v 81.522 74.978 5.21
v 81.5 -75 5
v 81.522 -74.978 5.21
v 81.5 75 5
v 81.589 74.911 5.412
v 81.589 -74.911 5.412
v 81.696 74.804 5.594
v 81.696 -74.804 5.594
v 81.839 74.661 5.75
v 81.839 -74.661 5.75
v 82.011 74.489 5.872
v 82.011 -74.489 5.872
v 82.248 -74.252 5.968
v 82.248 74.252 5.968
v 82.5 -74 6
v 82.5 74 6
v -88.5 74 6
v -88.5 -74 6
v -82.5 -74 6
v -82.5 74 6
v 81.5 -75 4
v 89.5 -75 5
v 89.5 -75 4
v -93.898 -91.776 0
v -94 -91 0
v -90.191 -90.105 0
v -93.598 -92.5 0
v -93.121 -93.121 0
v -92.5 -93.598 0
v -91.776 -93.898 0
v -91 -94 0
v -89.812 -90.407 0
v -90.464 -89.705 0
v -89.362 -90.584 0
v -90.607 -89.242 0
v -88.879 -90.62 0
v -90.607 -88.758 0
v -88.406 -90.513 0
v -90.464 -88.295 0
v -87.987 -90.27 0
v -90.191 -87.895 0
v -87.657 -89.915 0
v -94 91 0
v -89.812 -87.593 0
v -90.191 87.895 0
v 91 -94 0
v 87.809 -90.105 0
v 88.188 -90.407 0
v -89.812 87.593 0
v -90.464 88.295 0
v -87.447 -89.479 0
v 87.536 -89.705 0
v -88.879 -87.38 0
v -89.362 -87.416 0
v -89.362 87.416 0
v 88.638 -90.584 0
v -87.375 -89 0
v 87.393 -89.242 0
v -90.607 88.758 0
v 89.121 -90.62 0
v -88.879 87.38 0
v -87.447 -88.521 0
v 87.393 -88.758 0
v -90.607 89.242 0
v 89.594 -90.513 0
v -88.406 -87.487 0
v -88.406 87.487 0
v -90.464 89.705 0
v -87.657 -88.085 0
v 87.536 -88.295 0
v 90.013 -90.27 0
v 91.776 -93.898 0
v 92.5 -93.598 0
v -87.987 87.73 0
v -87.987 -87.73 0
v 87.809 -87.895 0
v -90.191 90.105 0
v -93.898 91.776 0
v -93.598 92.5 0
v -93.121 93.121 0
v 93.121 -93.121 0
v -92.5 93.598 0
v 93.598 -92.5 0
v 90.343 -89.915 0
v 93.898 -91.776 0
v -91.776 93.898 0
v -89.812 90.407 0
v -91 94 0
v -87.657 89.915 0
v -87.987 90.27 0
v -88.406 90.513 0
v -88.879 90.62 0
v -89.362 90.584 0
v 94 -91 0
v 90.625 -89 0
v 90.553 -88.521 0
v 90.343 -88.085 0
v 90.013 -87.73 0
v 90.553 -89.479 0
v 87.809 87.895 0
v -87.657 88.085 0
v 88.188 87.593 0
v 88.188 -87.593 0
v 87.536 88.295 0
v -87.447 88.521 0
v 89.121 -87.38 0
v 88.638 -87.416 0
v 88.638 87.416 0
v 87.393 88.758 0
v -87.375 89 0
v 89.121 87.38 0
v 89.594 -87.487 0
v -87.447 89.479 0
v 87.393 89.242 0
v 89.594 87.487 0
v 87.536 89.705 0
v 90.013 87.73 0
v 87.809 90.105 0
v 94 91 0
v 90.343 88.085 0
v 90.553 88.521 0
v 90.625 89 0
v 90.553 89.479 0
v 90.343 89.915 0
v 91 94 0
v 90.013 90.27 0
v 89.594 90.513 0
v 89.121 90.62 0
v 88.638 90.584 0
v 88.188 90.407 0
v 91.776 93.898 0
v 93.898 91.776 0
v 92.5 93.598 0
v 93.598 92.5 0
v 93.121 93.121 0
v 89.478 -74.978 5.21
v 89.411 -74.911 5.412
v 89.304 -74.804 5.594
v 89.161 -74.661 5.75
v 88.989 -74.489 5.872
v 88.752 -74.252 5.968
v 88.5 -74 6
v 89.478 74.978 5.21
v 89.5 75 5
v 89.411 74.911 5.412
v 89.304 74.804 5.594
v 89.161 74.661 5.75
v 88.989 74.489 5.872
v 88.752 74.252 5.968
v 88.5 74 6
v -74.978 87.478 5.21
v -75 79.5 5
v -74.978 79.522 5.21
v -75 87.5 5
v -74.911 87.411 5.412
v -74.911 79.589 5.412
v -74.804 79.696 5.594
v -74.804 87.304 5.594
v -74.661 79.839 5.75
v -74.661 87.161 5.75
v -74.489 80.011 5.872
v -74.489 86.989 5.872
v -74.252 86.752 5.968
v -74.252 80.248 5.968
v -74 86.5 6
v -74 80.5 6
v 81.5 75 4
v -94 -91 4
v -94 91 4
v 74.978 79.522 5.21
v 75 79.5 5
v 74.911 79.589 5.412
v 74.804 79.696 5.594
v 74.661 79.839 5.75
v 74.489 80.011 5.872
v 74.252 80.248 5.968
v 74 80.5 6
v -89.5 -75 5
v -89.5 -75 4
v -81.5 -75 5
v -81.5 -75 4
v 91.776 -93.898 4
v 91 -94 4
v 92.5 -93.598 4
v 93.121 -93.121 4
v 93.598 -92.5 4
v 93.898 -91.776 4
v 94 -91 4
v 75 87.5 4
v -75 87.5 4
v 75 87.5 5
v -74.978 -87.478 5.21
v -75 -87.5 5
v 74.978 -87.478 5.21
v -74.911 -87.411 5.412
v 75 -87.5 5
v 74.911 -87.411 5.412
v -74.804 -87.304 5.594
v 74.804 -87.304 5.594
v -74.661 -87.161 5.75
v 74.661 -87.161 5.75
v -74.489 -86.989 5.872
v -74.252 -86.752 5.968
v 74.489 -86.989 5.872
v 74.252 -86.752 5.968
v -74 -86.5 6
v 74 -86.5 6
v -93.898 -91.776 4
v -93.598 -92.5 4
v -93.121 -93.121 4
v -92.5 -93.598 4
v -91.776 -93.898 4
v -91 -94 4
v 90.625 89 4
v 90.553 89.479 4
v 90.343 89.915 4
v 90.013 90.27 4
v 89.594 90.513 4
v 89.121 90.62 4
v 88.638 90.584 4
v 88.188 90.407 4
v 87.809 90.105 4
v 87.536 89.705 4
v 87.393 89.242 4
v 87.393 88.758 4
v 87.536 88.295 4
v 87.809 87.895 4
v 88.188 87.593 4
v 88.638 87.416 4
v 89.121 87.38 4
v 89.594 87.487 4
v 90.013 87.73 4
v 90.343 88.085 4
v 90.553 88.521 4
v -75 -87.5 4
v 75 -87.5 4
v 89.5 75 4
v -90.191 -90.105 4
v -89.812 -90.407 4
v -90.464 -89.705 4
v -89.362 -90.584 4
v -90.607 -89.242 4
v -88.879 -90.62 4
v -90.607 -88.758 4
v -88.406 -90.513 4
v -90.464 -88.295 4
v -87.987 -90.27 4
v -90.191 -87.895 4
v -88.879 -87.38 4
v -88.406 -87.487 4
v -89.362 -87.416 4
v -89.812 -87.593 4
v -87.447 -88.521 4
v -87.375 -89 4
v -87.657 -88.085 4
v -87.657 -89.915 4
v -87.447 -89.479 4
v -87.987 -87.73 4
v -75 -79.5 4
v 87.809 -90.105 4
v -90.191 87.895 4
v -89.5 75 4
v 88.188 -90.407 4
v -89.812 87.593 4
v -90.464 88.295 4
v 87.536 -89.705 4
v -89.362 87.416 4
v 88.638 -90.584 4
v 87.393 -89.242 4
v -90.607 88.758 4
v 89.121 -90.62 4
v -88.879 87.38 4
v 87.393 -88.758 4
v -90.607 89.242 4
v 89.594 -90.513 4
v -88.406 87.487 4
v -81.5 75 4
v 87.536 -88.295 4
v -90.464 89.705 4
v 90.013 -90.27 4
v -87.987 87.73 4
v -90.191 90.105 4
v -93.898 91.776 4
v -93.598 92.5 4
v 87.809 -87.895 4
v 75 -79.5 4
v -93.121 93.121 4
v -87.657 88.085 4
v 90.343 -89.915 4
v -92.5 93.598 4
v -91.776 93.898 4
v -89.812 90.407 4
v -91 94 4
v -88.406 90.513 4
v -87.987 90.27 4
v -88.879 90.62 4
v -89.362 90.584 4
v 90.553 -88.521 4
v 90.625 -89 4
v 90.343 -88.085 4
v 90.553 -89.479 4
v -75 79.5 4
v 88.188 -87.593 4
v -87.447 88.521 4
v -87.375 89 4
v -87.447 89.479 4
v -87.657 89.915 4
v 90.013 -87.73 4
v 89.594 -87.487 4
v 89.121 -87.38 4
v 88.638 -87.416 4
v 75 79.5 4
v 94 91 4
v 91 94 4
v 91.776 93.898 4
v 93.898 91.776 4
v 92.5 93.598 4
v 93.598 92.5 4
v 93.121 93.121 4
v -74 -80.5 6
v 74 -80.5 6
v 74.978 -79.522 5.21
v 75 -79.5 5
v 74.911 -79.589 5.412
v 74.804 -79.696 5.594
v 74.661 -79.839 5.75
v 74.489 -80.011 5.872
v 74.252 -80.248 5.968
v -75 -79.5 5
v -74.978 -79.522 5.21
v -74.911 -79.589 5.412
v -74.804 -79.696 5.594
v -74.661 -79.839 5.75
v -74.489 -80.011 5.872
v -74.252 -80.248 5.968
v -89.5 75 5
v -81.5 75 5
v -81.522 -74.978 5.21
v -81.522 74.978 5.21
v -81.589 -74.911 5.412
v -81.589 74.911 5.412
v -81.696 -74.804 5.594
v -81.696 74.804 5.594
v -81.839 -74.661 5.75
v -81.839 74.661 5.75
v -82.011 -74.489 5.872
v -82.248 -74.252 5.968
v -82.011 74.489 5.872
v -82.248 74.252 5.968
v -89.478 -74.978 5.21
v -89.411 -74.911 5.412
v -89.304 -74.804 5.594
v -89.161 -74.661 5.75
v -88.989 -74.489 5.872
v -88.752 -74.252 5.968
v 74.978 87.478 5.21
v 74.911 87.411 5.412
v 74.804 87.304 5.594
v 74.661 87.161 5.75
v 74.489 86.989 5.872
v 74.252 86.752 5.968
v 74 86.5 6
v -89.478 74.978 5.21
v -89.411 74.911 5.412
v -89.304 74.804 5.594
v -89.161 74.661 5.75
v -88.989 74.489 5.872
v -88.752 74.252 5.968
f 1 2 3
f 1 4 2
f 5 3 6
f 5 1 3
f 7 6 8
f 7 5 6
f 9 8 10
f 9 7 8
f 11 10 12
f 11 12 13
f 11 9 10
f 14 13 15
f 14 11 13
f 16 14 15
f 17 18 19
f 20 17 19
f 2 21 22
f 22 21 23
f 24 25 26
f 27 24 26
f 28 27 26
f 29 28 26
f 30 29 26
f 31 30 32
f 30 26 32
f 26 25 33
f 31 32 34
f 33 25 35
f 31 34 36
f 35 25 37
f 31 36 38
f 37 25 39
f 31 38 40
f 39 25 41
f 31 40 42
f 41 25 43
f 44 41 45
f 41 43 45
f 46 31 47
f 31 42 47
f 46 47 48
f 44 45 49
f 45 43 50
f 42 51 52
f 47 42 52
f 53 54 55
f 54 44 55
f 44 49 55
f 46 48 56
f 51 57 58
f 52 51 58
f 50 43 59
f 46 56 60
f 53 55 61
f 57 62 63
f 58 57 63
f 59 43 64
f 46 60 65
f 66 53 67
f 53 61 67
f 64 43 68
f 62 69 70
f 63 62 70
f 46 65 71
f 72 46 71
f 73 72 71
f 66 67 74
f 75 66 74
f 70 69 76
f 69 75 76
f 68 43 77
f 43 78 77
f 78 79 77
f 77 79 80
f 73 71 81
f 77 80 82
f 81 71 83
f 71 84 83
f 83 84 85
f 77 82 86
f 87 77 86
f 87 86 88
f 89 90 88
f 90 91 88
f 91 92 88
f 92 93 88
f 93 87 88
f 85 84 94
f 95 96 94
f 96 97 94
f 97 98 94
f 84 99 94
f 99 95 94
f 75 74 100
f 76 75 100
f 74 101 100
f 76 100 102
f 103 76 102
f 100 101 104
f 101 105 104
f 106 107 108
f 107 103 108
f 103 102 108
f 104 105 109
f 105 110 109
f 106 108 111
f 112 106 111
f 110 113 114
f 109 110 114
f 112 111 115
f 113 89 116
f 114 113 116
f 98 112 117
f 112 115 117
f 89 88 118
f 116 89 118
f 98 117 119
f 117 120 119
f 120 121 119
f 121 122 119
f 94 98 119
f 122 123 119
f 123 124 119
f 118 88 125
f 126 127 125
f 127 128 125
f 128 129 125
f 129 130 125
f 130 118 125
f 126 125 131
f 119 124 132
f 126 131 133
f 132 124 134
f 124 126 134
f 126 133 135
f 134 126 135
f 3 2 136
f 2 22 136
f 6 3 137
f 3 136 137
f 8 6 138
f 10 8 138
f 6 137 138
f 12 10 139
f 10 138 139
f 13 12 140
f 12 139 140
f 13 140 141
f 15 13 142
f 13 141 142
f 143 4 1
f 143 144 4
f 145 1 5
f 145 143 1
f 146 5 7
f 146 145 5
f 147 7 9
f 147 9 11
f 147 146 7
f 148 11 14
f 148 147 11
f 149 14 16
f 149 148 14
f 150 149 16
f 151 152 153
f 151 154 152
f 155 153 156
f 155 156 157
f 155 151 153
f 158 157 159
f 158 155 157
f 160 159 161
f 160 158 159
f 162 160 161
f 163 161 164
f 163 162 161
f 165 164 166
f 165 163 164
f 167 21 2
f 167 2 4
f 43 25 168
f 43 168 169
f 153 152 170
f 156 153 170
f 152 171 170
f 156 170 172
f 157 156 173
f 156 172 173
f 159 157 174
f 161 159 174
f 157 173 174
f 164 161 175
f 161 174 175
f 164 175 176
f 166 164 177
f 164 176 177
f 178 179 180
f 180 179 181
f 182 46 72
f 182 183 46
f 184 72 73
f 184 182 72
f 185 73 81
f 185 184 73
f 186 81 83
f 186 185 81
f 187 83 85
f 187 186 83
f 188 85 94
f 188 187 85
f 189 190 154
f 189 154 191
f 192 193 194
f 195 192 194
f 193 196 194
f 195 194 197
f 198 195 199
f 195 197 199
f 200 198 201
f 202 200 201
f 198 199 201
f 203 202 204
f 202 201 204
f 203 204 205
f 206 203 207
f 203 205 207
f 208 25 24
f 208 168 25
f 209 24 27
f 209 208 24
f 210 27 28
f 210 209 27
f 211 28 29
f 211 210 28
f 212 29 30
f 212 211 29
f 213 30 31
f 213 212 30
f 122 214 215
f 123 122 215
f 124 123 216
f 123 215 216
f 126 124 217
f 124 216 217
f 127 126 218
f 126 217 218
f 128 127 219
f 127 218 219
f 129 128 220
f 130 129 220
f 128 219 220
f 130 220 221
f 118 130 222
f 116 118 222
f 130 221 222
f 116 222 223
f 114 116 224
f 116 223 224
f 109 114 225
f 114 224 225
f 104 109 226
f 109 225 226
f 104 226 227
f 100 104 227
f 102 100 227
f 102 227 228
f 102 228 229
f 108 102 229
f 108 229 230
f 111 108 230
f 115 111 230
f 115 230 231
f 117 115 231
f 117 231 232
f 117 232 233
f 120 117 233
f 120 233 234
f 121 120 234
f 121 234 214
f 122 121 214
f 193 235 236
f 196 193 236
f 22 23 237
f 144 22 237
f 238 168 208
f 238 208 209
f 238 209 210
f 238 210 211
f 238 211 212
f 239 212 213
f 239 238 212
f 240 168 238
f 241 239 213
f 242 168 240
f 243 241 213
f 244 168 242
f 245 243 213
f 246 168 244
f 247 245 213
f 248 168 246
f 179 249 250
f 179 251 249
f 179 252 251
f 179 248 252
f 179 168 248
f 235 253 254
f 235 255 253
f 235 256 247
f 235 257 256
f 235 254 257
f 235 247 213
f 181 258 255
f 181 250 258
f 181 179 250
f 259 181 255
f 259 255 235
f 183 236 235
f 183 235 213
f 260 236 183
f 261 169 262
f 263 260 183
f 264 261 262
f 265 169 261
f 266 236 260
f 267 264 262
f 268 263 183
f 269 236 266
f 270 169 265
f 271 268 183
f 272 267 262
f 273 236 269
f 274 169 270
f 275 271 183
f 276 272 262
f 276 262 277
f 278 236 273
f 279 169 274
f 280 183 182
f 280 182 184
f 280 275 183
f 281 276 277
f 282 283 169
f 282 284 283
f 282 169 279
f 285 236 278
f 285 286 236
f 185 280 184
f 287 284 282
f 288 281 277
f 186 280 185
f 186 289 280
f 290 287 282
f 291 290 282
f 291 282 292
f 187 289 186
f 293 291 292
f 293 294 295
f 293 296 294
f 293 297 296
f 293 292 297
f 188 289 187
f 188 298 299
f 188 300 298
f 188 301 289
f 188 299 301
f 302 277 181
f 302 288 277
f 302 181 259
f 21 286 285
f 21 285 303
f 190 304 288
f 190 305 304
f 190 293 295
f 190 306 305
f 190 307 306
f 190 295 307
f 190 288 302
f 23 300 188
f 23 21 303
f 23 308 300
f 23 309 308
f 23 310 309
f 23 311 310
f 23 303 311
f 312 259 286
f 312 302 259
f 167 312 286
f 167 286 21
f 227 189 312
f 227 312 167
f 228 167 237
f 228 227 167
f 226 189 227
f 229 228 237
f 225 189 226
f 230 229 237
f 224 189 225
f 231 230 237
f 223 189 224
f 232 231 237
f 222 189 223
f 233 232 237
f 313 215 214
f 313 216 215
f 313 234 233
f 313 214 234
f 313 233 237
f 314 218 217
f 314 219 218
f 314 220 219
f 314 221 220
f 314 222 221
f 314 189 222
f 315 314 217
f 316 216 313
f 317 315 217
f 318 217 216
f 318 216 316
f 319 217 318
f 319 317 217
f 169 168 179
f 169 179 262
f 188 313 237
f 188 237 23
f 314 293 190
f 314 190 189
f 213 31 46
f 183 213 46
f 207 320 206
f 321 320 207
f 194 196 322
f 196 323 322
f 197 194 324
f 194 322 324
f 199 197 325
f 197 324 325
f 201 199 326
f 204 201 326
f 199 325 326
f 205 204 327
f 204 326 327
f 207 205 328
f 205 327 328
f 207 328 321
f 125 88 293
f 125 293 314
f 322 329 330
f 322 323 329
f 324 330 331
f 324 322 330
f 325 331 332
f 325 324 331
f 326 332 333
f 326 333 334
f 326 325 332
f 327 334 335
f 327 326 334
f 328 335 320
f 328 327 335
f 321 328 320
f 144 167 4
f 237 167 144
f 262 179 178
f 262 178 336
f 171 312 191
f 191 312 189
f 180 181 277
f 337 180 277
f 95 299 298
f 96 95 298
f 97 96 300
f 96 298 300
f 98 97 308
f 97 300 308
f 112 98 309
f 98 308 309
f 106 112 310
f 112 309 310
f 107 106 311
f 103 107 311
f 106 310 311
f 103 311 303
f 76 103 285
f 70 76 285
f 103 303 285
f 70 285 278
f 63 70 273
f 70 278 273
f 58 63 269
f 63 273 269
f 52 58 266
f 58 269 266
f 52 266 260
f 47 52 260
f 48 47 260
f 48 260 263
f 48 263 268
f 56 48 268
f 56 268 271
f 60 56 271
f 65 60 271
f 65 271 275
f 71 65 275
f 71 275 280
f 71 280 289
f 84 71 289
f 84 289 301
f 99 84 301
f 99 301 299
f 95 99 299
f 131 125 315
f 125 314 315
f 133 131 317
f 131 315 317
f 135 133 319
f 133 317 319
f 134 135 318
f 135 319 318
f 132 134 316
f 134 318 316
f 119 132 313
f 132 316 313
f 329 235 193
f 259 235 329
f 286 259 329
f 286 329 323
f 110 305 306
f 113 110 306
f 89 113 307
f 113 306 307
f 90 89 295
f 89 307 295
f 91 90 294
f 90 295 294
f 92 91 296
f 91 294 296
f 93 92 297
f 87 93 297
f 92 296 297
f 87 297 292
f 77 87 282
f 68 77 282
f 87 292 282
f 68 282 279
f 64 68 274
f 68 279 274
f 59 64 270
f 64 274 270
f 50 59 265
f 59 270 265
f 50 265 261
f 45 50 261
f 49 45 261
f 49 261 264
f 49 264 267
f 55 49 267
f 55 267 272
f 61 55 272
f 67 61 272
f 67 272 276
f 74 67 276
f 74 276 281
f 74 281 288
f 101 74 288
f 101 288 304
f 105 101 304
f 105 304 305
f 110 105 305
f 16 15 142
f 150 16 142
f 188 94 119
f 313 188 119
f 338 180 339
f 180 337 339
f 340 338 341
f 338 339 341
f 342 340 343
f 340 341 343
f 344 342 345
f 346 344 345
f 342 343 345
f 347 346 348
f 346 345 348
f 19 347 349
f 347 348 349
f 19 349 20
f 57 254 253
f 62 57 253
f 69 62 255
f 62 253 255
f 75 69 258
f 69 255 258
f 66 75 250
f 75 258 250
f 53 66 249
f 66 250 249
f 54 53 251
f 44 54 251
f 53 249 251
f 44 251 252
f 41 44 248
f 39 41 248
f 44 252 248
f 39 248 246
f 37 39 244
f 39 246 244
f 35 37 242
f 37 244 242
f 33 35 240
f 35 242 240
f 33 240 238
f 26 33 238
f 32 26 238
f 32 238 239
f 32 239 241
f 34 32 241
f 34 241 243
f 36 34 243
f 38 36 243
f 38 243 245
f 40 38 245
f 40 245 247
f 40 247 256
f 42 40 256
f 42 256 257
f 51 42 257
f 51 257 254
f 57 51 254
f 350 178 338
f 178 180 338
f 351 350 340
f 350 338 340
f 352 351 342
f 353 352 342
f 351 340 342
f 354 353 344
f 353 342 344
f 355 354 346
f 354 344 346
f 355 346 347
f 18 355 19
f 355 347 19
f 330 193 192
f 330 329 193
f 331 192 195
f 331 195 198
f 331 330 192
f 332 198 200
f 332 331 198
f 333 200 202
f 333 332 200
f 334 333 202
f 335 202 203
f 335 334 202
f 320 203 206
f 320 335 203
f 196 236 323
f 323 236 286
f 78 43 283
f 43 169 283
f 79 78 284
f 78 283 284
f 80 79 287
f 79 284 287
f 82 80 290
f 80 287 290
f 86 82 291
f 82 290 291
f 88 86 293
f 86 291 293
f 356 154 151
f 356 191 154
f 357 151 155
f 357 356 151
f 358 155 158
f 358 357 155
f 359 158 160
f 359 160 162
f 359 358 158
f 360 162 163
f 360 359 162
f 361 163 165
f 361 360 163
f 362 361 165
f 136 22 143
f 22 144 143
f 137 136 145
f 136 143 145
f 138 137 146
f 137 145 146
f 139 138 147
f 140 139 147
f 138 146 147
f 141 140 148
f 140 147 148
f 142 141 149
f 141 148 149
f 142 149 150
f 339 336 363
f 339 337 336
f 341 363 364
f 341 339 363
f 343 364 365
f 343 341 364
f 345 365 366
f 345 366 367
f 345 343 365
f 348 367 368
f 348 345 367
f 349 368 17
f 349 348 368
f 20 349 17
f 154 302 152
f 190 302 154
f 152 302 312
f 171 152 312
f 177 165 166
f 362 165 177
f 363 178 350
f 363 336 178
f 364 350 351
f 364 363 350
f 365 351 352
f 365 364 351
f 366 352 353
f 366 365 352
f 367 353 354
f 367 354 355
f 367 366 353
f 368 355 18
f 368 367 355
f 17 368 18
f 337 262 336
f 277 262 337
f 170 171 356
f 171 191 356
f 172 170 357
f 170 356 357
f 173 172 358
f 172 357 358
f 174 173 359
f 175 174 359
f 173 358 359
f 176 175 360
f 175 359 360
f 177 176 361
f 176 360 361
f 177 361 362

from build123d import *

# Parameters (mm, degrees)
SKETCH_W      = 188
SKETCH_H      = 188
PAD_DEPTH     = 4
SKETCH001_R   = 1.625
POCKET_DEPTH  = 4.001
FILLET_R      = 3
SKETCH003_W   = 150
SKETCH003_H   = 8
SKETCH003_W_2 = 8
SKETCH003_H_2 = 150
PAD001_DEPTH  = 2
FILLET001_R   = 1


with BuildPart() as part:
    # Sketch → Pad (new body)
    with BuildSketch(Plane.XY):
        Rectangle(SKETCH_W, SKETCH_H)
    extrude(amount=PAD_DEPTH)

    # Sketch001 (on Face6 of Pad) → Pocket (cut, through all)
    with BuildSketch(Plane.XY.offset(4)):
        with Locations((-89, 89)):
            Circle(SKETCH001_R)
        with Locations((89, 89)):
            Circle(SKETCH001_R)
        with Locations((89, -89)):
            Circle(SKETCH001_R)
        with Locations((-89, -89)):
            Circle(SKETCH001_R)
    extrude(amount=-POCKET_DEPTH, mode=Mode.SUBTRACT)

    # Fillet
    fillet_edges = [part.edges().sort_by_distance(p)[0] for p in [
        (-94, 94, 2),
        (94, 94, 2),
        (-94, -94, 2),
        (94, -94, 2),
    ]]
    fillet(fillet_edges, radius=FILLET_R)

    # Sketch003 (on Face5 of Fillet) → Pad001 (join)
    with BuildSketch(Plane.XY.offset(4)):
        with Locations((0, -83.5)):
            Rectangle(SKETCH003_W, SKETCH003_H)
        with Locations((0, 83.5)):
            Rectangle(SKETCH003_W, SKETCH003_H)
        with Locations((-85.5, 0)):
            Rectangle(SKETCH003_W_2, SKETCH003_H_2)
        with Locations((85.5, 0)):
            Rectangle(SKETCH003_W_2, SKETCH003_H_2)
    extrude(amount=PAD001_DEPTH)

    # Fillet001
    fillet001_edges = [part.edges().sort_by_distance(p)[0] for p in [
        (-85.5, 75, 6),
        (-81.5, 0, 6),
        (-85.5, -75, 6),
        (-89.5, 0, 6),
        (0, -79.5, 6),
        (75, -83.5, 6),
        (0, -87.5, 6),
        (-75, -83.5, 6),
        (85.5, 75, 6),
        (89.5, 0, 6),
        (85.5, -75, 6),
        (81.5, 0, 6),
        (0, 87.5, 6),
        (75, 83.5, 6),
        (0, 79.5, 6),
        (-75, 83.5, 6),
    ]]
    fillet(fillet001_edges, radius=FILLET001_R)


solid = part.part
